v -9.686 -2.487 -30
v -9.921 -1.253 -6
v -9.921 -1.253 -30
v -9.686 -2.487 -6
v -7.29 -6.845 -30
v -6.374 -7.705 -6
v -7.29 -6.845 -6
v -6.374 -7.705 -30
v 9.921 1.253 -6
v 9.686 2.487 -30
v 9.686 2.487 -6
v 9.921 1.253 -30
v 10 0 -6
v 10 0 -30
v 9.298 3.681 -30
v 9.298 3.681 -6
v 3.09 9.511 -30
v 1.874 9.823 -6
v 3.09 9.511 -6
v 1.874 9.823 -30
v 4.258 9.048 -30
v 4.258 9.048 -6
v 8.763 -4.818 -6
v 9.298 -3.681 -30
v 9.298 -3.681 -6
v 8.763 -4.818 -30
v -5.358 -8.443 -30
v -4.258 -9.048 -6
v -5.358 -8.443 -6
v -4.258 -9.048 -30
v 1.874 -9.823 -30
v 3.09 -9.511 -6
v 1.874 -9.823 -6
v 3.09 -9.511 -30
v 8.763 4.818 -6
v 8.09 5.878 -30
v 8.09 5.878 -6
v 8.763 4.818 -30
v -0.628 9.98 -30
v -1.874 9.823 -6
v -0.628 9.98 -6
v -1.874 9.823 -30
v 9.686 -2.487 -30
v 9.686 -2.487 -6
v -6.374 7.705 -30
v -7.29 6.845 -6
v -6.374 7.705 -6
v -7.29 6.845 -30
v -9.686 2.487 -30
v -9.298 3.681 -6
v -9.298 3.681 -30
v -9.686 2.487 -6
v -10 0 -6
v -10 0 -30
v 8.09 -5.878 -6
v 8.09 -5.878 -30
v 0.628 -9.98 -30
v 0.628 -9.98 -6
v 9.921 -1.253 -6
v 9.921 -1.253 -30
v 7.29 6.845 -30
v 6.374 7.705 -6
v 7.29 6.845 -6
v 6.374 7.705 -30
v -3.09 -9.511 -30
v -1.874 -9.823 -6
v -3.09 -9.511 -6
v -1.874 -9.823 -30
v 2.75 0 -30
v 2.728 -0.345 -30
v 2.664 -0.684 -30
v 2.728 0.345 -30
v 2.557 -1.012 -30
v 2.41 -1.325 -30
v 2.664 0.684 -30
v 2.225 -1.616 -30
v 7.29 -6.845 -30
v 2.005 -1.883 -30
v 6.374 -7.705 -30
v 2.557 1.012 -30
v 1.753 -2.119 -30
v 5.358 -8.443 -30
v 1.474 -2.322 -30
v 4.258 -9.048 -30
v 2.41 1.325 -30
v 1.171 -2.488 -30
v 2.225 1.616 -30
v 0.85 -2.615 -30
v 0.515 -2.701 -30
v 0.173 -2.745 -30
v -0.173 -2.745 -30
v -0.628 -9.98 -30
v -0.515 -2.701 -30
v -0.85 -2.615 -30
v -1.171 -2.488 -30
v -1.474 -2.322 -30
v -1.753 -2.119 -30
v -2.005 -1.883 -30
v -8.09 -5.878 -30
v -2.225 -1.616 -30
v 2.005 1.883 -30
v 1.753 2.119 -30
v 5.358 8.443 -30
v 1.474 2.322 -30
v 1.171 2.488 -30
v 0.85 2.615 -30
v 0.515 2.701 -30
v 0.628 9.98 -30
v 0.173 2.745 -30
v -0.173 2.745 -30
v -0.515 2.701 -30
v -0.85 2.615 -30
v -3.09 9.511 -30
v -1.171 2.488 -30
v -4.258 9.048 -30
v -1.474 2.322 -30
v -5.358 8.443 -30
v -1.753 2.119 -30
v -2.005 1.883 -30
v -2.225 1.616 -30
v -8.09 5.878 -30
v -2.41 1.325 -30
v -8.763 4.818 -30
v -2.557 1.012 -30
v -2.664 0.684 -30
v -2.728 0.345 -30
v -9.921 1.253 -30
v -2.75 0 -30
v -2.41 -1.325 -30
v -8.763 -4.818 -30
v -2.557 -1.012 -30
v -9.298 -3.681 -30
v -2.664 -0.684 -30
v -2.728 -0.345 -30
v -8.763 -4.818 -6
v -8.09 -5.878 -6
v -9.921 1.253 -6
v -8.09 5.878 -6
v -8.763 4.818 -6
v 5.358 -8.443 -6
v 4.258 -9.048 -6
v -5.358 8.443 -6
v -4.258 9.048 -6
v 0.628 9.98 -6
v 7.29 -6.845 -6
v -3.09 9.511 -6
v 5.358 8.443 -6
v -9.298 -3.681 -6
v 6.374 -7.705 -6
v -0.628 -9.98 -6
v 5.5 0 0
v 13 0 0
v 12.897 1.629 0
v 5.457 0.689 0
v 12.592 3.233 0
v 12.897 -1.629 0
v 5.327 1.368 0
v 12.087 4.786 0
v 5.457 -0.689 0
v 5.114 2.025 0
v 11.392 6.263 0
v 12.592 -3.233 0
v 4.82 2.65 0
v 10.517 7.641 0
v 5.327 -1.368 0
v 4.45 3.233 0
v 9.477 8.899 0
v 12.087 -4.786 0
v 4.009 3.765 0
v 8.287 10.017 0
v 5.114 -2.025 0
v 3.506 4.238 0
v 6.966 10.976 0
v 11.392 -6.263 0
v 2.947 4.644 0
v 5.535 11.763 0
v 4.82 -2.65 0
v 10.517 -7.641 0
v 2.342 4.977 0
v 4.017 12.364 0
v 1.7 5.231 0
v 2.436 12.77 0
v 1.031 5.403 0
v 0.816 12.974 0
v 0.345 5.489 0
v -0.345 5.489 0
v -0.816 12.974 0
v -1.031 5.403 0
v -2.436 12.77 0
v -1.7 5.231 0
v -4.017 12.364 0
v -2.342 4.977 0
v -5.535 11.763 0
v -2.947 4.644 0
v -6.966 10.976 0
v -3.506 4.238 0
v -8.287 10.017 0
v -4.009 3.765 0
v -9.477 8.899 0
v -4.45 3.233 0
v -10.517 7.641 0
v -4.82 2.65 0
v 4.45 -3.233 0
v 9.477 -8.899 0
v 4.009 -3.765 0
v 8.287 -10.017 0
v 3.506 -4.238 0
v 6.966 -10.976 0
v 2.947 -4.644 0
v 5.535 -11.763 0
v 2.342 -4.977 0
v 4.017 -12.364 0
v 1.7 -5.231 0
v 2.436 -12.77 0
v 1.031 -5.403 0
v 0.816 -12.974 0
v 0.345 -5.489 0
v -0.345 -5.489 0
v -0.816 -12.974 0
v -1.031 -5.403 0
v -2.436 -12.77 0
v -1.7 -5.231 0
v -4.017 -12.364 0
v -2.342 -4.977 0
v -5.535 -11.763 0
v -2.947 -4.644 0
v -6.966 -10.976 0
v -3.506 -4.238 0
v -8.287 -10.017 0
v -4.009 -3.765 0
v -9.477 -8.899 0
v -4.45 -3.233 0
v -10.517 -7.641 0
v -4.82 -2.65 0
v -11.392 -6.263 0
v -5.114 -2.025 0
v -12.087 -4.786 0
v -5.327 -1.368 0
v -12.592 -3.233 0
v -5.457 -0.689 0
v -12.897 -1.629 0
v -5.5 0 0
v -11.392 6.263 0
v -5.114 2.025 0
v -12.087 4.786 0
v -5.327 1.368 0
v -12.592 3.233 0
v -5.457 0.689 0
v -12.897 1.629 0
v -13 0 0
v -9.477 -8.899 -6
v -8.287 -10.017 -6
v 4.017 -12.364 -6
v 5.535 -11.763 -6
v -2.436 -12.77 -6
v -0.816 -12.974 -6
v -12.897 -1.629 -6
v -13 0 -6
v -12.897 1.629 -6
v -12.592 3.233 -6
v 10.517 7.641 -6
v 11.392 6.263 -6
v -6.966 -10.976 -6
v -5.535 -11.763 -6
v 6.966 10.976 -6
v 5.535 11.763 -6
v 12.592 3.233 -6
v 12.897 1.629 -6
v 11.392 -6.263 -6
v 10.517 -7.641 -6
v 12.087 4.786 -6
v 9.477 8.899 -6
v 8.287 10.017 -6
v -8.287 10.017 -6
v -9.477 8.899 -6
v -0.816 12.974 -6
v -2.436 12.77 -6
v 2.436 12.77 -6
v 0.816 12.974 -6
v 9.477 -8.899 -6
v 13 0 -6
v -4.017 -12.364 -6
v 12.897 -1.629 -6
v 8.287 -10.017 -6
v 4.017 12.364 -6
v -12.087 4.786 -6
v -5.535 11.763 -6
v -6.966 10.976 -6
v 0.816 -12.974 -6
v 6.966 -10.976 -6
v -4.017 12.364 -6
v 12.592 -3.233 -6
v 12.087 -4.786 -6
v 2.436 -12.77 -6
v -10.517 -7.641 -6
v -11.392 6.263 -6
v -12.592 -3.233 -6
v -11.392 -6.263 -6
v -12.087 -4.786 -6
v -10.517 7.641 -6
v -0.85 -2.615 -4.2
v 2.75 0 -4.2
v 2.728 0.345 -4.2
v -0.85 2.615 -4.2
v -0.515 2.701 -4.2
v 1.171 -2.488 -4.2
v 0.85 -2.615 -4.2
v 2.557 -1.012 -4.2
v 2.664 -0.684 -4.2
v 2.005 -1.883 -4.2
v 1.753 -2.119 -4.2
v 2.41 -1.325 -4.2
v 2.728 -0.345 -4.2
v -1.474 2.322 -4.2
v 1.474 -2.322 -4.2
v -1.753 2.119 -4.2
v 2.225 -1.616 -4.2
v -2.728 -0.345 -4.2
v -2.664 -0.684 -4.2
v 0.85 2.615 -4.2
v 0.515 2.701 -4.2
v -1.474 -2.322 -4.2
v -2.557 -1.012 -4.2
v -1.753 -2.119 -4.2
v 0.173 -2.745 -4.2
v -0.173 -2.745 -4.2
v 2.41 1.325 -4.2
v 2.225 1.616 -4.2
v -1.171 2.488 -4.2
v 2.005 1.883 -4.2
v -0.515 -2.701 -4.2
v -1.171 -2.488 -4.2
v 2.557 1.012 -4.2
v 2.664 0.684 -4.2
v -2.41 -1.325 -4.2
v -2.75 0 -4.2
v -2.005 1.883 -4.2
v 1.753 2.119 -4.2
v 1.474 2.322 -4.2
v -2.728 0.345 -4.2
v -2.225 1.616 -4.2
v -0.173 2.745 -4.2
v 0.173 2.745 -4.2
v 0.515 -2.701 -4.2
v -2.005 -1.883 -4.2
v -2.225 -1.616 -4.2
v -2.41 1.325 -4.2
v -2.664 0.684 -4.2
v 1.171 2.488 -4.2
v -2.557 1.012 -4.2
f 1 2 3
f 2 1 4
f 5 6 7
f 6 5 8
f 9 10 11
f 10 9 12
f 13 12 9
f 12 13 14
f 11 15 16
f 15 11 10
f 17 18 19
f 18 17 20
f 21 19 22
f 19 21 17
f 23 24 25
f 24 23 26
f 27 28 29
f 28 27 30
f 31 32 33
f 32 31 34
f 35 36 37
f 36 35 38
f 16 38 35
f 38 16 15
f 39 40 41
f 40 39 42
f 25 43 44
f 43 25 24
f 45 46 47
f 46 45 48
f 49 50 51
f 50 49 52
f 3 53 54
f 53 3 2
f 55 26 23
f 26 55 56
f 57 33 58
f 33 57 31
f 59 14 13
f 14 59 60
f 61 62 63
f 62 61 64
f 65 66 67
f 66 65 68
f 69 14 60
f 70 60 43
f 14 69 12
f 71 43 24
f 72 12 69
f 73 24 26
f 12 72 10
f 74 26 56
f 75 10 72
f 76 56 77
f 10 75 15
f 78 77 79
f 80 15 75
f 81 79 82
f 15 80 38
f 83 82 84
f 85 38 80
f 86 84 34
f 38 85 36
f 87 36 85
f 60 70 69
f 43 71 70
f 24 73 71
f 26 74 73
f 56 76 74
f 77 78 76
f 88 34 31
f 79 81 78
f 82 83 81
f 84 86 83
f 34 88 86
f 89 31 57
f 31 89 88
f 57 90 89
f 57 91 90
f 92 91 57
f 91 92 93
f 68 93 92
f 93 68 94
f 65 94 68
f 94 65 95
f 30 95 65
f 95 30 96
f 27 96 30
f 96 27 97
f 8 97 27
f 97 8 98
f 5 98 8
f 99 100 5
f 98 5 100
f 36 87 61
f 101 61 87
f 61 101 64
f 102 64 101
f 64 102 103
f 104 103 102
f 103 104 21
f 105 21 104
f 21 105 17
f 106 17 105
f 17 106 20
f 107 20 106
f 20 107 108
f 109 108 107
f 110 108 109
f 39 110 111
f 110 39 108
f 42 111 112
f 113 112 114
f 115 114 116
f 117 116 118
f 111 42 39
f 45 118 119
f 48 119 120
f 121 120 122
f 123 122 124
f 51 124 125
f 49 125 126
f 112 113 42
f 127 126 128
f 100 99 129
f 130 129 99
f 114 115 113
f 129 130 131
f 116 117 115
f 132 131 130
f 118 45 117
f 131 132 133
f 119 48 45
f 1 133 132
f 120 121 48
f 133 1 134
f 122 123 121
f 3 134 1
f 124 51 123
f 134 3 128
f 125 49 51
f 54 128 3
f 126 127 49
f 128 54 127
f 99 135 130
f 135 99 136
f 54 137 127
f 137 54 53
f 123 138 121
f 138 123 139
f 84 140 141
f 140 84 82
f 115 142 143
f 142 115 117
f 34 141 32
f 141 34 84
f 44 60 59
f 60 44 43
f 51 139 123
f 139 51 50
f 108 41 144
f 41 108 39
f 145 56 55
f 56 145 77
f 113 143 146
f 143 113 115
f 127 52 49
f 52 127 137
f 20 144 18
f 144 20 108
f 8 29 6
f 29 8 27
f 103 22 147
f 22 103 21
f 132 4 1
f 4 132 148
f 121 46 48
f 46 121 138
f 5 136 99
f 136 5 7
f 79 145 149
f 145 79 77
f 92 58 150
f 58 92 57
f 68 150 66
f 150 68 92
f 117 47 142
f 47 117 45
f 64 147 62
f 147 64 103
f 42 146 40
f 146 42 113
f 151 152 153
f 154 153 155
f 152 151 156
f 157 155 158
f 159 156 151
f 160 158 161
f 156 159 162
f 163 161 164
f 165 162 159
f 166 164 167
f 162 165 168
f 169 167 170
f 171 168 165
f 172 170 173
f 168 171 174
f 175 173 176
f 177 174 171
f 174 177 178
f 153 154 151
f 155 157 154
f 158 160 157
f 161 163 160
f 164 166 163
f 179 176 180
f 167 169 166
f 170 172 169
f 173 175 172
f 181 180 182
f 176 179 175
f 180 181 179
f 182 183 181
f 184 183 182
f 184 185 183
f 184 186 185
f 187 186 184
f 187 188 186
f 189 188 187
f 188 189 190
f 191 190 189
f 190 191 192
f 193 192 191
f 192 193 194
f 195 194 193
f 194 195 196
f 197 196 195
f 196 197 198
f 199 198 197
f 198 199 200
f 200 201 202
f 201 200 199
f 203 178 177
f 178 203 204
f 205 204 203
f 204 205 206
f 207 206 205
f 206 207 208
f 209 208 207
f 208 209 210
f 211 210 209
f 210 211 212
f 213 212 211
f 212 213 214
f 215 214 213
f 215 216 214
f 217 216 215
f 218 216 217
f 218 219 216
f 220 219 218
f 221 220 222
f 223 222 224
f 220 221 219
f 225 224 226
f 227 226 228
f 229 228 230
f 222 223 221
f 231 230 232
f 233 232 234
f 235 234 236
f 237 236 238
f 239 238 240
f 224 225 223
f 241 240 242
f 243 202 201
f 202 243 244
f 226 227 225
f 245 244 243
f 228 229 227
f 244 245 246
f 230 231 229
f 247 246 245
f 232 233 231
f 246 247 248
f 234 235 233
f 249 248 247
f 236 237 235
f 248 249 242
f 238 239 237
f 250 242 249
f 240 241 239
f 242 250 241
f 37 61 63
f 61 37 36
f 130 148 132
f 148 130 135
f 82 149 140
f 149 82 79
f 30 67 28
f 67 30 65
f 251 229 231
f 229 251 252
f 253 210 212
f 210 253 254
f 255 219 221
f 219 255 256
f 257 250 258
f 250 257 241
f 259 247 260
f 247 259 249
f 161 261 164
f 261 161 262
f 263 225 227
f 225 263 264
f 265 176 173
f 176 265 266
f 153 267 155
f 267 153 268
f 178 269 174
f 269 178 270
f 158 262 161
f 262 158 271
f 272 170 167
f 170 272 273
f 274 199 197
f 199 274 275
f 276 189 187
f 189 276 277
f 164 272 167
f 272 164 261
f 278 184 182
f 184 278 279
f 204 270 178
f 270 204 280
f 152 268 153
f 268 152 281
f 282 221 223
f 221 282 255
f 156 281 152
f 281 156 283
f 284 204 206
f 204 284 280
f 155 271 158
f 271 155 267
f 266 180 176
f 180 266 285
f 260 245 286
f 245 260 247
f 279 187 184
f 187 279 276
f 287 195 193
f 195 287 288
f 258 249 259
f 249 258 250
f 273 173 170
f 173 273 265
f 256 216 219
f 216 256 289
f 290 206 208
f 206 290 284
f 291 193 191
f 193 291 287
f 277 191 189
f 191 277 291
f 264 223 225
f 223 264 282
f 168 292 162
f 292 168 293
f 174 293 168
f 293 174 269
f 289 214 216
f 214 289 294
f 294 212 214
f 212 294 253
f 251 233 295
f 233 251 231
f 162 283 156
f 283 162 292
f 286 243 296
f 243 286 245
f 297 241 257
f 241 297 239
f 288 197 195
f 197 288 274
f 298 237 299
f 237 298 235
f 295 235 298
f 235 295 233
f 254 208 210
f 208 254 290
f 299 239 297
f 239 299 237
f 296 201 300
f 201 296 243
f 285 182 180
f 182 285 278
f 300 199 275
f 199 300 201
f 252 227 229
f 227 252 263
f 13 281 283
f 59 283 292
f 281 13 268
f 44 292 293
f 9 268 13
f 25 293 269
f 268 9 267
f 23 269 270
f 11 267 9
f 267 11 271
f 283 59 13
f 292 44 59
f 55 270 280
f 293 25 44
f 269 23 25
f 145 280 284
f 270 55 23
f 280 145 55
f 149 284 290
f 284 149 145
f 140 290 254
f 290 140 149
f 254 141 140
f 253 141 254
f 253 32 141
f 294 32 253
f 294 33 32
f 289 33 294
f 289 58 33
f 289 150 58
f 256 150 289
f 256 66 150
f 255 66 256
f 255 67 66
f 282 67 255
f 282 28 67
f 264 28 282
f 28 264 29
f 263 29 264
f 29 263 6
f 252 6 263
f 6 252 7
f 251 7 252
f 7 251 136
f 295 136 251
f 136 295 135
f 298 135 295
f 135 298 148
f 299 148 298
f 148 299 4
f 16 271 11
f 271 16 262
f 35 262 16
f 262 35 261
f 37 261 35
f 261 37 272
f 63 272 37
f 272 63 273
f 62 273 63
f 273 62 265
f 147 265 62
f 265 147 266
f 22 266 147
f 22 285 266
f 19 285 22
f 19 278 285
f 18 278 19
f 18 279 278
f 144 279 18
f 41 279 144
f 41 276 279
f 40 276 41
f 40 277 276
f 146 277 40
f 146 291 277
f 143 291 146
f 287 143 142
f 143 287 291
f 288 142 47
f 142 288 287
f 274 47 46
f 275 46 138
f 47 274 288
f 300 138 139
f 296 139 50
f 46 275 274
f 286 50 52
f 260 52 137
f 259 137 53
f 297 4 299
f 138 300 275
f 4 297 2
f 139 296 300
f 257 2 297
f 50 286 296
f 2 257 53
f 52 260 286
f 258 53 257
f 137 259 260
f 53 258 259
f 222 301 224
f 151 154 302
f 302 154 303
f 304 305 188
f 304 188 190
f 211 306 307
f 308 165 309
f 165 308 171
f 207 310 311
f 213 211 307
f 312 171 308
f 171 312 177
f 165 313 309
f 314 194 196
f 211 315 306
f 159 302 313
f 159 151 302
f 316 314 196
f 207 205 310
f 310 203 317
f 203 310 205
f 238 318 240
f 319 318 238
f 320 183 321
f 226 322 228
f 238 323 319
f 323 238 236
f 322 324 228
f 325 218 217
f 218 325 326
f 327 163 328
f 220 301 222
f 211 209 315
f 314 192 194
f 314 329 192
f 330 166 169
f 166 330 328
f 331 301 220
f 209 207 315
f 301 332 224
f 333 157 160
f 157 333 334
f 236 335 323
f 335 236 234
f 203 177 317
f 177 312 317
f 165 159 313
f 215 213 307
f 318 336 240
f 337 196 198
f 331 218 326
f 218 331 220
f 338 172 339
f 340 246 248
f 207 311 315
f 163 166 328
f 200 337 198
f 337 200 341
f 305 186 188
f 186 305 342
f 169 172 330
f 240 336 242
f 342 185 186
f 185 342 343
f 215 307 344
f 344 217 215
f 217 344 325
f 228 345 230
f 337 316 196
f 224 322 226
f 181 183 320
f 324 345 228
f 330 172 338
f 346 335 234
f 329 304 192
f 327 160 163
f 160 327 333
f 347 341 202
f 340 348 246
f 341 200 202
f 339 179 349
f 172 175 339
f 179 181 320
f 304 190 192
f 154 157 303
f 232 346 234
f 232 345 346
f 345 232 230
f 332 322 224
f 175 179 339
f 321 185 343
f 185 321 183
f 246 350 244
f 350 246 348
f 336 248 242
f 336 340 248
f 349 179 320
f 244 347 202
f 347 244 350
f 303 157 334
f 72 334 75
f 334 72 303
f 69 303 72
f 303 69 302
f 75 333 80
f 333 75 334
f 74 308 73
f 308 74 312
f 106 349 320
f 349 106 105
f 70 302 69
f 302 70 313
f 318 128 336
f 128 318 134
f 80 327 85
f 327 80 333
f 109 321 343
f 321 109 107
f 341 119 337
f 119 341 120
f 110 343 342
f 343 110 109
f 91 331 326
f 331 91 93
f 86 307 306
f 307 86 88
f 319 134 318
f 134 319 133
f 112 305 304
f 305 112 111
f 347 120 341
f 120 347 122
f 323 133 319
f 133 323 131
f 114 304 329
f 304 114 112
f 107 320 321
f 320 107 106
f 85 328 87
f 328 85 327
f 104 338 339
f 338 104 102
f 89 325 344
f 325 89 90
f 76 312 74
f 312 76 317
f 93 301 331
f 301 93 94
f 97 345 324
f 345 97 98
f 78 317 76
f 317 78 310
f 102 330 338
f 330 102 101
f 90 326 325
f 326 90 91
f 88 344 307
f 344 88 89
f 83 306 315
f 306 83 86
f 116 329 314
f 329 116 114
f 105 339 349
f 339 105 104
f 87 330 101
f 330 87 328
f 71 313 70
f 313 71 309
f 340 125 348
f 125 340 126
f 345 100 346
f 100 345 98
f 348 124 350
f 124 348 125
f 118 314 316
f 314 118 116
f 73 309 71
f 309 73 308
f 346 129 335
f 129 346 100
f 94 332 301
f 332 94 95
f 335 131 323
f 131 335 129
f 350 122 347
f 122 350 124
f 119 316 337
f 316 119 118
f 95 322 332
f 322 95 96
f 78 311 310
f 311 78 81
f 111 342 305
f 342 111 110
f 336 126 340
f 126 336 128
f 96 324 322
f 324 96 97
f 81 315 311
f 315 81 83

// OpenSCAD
$fn = 50;


difference() {
	union() {
		translate(v = [0, 0, -30.0000000000]) {
			cylinder(h = 30, r = 10.0000000000);
		}
		translate(v = [0, 0, -6.0000000000]) {
			cylinder(h = 6, r = 13.0000000000);
		}
	}
	union() {
		translate(v = [0, 0, 0]) {
			rotate(a = [0, 0, 0]) {
				difference() {
					union() {
						#translate(v = [0, 0, -30.0000000000]) {
							cylinder(h = 30, r = 2.2500000000);
						}
						#translate(v = [0, 0, -4.2000000000]) {
							cylinder(h = 4.2000000000, r1 = 2.7500000000, r2 = 5.5000000000);
						}
						#translate(v = [0, 0, -30.0000000000]) {
							cylinder(h = 30, r = 2.7500000000);
						}
						#translate(v = [0, 0, -30.0000000000]) {
							cylinder(h = 30, r = 2.2500000000);
						}
					}
					union();
				}
			}
		}
	}
}
